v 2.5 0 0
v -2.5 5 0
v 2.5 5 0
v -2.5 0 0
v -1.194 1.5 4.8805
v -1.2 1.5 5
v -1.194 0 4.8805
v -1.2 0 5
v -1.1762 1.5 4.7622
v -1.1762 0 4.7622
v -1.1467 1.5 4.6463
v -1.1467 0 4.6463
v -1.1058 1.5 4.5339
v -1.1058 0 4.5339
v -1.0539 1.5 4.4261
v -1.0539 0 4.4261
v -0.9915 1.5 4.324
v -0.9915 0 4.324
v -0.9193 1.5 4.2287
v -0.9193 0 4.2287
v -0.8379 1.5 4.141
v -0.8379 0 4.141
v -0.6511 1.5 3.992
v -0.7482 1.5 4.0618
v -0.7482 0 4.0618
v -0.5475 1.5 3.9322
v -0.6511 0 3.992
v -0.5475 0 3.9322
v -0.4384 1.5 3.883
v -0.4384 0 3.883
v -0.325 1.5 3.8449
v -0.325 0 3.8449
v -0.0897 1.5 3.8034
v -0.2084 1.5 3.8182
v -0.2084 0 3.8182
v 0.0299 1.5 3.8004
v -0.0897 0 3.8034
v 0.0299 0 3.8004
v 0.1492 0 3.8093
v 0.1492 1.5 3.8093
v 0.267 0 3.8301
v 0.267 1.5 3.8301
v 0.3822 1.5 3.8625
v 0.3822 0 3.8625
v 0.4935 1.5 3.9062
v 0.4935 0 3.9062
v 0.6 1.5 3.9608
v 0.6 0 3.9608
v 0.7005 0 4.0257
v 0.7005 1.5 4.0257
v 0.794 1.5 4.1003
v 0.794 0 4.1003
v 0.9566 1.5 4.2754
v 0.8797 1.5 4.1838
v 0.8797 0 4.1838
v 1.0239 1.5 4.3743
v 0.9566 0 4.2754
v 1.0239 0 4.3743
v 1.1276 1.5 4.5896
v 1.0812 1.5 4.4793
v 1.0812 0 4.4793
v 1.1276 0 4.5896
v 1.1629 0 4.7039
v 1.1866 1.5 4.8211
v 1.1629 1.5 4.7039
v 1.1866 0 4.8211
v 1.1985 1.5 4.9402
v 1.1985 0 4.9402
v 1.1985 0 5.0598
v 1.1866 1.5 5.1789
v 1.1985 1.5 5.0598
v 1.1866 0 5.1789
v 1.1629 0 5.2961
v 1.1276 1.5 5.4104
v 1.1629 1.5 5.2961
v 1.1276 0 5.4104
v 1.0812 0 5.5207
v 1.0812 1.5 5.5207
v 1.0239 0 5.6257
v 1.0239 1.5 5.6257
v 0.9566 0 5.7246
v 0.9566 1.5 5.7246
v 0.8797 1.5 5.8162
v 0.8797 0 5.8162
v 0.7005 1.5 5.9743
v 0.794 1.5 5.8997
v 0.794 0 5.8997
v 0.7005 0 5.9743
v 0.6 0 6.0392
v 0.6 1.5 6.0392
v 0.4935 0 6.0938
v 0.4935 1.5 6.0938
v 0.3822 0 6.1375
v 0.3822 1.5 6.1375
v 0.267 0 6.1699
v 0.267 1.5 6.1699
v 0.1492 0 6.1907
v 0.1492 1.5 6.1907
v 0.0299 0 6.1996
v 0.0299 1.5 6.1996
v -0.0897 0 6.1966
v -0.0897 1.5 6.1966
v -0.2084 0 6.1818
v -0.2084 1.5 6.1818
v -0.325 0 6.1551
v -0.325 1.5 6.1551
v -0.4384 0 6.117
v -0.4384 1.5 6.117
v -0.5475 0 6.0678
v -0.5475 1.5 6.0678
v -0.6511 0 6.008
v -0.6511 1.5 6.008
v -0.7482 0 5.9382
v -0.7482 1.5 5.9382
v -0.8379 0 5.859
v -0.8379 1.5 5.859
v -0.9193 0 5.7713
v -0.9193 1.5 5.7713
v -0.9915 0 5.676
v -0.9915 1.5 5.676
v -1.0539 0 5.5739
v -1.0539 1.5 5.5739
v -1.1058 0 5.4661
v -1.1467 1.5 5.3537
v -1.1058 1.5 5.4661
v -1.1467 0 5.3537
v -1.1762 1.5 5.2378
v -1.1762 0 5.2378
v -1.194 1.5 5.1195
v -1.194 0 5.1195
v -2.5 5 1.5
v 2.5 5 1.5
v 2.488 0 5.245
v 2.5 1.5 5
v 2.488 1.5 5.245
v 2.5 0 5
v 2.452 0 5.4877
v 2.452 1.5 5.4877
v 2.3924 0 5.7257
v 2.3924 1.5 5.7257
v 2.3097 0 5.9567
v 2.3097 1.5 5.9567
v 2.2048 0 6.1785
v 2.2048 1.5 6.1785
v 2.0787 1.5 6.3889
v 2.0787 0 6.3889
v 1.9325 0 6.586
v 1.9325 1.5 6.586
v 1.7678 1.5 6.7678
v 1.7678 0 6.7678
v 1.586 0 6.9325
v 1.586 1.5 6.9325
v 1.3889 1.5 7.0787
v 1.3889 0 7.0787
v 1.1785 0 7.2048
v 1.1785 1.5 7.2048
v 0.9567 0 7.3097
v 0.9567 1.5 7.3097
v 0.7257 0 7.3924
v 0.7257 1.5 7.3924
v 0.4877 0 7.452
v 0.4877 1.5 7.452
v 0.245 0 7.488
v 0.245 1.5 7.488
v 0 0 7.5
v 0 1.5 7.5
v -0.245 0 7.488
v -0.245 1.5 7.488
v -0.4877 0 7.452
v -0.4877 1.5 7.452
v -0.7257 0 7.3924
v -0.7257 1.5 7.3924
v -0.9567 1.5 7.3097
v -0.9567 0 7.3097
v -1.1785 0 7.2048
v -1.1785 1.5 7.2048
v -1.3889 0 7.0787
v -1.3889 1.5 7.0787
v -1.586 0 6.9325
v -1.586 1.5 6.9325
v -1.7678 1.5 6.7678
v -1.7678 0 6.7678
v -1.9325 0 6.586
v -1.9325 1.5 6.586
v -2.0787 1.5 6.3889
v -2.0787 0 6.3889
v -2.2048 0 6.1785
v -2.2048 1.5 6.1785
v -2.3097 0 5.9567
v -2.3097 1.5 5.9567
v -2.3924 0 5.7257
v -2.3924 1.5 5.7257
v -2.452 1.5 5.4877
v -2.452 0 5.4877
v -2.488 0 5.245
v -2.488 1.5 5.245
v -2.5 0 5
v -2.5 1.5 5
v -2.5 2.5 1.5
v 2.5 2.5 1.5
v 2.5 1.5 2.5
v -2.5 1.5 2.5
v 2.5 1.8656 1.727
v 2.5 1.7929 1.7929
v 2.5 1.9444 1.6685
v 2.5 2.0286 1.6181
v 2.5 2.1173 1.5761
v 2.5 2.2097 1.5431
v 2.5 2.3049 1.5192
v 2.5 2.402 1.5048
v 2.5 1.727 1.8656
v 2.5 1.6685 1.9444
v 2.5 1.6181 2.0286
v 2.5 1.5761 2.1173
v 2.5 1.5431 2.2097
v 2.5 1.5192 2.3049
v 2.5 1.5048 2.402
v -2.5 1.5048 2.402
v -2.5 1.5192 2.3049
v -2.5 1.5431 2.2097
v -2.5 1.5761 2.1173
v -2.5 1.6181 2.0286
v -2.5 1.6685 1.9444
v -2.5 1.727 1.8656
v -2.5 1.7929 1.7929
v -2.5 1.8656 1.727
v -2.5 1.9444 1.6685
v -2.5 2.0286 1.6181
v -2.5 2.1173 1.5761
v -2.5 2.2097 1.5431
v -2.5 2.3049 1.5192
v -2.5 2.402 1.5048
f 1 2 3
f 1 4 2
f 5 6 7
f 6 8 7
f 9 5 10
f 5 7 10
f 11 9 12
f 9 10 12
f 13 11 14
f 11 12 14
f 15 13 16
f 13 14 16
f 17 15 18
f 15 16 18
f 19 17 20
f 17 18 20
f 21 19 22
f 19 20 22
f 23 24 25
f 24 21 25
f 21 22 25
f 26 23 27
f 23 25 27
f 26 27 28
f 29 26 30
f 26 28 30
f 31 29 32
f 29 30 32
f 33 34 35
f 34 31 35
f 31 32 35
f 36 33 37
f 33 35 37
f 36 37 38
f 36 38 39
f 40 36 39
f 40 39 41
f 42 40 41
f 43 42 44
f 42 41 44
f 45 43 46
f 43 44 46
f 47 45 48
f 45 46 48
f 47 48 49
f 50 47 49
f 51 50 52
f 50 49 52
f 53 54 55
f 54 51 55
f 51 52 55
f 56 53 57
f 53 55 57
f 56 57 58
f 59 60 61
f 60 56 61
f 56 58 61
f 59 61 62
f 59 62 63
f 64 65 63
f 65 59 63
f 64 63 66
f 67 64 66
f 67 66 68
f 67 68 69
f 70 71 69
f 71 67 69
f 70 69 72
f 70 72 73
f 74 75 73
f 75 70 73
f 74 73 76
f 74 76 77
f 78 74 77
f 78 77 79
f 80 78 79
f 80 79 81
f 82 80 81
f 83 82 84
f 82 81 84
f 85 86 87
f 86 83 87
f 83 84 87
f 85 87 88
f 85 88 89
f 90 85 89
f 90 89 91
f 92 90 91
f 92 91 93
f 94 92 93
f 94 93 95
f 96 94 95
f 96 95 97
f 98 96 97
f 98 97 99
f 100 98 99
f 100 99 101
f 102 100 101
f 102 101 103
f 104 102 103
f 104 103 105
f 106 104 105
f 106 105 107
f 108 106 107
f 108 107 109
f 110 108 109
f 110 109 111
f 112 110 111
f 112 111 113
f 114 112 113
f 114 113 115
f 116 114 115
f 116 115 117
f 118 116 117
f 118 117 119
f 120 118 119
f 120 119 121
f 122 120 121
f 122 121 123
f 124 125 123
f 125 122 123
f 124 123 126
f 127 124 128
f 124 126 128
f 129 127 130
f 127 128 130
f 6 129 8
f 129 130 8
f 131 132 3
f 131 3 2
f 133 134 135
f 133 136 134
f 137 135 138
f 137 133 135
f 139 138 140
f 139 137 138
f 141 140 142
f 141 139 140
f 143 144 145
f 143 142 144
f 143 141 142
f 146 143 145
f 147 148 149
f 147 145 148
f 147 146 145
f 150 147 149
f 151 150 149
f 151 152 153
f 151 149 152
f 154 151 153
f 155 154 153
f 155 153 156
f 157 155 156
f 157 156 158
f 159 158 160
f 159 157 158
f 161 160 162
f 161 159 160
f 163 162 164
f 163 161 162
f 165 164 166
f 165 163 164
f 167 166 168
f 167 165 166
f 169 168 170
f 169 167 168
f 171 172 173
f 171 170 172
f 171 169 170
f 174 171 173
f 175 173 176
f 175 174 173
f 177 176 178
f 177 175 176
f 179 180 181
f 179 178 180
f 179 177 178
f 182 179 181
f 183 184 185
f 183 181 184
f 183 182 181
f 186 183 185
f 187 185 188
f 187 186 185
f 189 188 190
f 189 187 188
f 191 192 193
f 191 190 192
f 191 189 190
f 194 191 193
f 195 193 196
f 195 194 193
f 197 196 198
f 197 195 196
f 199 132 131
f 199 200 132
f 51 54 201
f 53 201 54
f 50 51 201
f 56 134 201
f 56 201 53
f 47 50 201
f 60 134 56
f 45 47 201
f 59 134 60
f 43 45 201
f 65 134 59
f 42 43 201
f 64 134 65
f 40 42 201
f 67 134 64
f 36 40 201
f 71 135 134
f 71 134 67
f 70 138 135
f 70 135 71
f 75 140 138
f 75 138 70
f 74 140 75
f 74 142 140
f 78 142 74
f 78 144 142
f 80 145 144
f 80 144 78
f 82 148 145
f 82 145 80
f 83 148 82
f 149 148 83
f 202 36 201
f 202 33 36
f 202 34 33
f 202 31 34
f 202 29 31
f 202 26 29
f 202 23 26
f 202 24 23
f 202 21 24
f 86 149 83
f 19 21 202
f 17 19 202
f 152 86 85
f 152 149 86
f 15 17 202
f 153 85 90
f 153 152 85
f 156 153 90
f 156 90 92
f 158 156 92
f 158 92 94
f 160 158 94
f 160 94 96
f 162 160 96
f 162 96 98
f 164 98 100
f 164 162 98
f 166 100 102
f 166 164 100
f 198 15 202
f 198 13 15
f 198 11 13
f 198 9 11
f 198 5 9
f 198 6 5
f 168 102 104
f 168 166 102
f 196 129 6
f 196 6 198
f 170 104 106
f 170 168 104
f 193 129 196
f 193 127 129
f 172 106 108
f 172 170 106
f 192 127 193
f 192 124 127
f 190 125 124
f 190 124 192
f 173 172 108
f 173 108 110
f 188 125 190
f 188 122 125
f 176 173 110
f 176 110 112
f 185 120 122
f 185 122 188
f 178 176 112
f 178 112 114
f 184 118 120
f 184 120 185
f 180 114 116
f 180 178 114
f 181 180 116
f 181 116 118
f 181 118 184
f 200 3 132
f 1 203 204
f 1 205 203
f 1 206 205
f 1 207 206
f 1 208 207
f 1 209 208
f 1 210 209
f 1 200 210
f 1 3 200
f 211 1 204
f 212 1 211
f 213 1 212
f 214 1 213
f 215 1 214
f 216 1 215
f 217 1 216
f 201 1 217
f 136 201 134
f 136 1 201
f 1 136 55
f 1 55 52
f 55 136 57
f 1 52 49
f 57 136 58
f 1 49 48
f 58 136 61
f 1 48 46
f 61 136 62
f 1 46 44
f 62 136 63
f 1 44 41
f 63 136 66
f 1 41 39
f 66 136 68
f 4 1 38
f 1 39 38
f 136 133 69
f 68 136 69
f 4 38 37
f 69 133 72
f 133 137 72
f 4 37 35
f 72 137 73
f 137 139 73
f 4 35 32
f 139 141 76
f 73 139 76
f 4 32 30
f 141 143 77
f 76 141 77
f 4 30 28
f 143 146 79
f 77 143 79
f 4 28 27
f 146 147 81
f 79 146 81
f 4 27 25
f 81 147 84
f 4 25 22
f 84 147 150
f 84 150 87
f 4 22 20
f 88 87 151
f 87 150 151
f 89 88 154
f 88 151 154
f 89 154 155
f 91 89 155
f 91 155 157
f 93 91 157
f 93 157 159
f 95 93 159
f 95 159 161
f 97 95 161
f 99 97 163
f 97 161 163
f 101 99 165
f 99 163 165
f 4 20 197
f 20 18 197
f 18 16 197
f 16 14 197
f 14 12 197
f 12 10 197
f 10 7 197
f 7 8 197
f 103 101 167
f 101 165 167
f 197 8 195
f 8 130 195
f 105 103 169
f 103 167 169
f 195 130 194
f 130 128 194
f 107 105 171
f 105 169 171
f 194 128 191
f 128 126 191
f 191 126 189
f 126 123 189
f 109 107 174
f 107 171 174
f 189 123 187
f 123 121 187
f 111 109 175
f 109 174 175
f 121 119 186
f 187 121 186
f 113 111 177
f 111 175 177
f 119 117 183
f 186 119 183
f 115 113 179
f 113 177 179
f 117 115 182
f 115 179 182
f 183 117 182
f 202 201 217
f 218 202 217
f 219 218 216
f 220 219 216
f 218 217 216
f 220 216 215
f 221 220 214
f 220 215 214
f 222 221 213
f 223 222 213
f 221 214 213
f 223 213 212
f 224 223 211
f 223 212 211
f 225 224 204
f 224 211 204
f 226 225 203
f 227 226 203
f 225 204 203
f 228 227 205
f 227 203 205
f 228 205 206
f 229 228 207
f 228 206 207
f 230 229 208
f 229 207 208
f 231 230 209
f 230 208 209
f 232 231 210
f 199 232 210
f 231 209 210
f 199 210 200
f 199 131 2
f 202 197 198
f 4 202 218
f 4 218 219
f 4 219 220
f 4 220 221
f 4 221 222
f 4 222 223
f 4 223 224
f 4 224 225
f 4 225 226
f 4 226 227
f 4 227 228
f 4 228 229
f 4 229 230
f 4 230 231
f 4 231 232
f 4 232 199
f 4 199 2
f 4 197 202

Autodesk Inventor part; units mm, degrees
ref_plane "YZ Plane" through (0, 0, 0) normal (1, 0, 0) x (0, 1, 0)
ref_plane "XZ Plane" through (0, 0, 0) normal (0, 1, 0) x (-1, 0, 0)
ref_plane "XY Plane" through (0, 0, 0) normal (0, 0, 1) x (1, 0, 0)
sketch "Boceto2" plane through (0, 0, 0) normal (0, 1, 0) x (-1, 0, 0)
  line L0 (2.5, 5) -> (2.5, 0)
  line L1 (2.5, 0) -> (-2.5, 0)
  line L2 (-2.5, 0) -> (-2.5, 5)
  arc A0 (2.5, 5) -> (-2.5, 5) centre (0, 5) ccw
  circle A1 centre (0, 5) radius 1.2
  point P0 (0, 0)
  point P1 (0, 0)
  dimension "d2" = 5
  dimension "d3" = 5
  dimension "d4" = 2.4
extrude "Extrusión1" add sketch "Boceto2" along normal blind 1.5
sketch "Boceto3" plane through (0, 0, 0) normal (0, 1, 0) x (-1, 0, 0)
  line L0 (-2.5, 1.5) -> (2.5, 1.5)
  line L1 (2.5, 1.5) -> (2.5, 0)
  line L2 (2.5, 0) -> (-2.5, 0)
  line L3 (-2.5, 0) -> (-2.5, 1.5)
  line L4 (-2.5, 0) -> (2.5, 0) projected
  point P0 (0, 0)
  point P1 (0, 0)
  dimension "d7" = 5
  dimension "d8" = 1.5
extrude "Extrusión2" add sketch "Boceto3" along normal blind 5
fillet "Empalme1" radius 1 1 edges at (0, 1.5, 1.5)
properties part number "support_electronics" material "Plástico ABS"
